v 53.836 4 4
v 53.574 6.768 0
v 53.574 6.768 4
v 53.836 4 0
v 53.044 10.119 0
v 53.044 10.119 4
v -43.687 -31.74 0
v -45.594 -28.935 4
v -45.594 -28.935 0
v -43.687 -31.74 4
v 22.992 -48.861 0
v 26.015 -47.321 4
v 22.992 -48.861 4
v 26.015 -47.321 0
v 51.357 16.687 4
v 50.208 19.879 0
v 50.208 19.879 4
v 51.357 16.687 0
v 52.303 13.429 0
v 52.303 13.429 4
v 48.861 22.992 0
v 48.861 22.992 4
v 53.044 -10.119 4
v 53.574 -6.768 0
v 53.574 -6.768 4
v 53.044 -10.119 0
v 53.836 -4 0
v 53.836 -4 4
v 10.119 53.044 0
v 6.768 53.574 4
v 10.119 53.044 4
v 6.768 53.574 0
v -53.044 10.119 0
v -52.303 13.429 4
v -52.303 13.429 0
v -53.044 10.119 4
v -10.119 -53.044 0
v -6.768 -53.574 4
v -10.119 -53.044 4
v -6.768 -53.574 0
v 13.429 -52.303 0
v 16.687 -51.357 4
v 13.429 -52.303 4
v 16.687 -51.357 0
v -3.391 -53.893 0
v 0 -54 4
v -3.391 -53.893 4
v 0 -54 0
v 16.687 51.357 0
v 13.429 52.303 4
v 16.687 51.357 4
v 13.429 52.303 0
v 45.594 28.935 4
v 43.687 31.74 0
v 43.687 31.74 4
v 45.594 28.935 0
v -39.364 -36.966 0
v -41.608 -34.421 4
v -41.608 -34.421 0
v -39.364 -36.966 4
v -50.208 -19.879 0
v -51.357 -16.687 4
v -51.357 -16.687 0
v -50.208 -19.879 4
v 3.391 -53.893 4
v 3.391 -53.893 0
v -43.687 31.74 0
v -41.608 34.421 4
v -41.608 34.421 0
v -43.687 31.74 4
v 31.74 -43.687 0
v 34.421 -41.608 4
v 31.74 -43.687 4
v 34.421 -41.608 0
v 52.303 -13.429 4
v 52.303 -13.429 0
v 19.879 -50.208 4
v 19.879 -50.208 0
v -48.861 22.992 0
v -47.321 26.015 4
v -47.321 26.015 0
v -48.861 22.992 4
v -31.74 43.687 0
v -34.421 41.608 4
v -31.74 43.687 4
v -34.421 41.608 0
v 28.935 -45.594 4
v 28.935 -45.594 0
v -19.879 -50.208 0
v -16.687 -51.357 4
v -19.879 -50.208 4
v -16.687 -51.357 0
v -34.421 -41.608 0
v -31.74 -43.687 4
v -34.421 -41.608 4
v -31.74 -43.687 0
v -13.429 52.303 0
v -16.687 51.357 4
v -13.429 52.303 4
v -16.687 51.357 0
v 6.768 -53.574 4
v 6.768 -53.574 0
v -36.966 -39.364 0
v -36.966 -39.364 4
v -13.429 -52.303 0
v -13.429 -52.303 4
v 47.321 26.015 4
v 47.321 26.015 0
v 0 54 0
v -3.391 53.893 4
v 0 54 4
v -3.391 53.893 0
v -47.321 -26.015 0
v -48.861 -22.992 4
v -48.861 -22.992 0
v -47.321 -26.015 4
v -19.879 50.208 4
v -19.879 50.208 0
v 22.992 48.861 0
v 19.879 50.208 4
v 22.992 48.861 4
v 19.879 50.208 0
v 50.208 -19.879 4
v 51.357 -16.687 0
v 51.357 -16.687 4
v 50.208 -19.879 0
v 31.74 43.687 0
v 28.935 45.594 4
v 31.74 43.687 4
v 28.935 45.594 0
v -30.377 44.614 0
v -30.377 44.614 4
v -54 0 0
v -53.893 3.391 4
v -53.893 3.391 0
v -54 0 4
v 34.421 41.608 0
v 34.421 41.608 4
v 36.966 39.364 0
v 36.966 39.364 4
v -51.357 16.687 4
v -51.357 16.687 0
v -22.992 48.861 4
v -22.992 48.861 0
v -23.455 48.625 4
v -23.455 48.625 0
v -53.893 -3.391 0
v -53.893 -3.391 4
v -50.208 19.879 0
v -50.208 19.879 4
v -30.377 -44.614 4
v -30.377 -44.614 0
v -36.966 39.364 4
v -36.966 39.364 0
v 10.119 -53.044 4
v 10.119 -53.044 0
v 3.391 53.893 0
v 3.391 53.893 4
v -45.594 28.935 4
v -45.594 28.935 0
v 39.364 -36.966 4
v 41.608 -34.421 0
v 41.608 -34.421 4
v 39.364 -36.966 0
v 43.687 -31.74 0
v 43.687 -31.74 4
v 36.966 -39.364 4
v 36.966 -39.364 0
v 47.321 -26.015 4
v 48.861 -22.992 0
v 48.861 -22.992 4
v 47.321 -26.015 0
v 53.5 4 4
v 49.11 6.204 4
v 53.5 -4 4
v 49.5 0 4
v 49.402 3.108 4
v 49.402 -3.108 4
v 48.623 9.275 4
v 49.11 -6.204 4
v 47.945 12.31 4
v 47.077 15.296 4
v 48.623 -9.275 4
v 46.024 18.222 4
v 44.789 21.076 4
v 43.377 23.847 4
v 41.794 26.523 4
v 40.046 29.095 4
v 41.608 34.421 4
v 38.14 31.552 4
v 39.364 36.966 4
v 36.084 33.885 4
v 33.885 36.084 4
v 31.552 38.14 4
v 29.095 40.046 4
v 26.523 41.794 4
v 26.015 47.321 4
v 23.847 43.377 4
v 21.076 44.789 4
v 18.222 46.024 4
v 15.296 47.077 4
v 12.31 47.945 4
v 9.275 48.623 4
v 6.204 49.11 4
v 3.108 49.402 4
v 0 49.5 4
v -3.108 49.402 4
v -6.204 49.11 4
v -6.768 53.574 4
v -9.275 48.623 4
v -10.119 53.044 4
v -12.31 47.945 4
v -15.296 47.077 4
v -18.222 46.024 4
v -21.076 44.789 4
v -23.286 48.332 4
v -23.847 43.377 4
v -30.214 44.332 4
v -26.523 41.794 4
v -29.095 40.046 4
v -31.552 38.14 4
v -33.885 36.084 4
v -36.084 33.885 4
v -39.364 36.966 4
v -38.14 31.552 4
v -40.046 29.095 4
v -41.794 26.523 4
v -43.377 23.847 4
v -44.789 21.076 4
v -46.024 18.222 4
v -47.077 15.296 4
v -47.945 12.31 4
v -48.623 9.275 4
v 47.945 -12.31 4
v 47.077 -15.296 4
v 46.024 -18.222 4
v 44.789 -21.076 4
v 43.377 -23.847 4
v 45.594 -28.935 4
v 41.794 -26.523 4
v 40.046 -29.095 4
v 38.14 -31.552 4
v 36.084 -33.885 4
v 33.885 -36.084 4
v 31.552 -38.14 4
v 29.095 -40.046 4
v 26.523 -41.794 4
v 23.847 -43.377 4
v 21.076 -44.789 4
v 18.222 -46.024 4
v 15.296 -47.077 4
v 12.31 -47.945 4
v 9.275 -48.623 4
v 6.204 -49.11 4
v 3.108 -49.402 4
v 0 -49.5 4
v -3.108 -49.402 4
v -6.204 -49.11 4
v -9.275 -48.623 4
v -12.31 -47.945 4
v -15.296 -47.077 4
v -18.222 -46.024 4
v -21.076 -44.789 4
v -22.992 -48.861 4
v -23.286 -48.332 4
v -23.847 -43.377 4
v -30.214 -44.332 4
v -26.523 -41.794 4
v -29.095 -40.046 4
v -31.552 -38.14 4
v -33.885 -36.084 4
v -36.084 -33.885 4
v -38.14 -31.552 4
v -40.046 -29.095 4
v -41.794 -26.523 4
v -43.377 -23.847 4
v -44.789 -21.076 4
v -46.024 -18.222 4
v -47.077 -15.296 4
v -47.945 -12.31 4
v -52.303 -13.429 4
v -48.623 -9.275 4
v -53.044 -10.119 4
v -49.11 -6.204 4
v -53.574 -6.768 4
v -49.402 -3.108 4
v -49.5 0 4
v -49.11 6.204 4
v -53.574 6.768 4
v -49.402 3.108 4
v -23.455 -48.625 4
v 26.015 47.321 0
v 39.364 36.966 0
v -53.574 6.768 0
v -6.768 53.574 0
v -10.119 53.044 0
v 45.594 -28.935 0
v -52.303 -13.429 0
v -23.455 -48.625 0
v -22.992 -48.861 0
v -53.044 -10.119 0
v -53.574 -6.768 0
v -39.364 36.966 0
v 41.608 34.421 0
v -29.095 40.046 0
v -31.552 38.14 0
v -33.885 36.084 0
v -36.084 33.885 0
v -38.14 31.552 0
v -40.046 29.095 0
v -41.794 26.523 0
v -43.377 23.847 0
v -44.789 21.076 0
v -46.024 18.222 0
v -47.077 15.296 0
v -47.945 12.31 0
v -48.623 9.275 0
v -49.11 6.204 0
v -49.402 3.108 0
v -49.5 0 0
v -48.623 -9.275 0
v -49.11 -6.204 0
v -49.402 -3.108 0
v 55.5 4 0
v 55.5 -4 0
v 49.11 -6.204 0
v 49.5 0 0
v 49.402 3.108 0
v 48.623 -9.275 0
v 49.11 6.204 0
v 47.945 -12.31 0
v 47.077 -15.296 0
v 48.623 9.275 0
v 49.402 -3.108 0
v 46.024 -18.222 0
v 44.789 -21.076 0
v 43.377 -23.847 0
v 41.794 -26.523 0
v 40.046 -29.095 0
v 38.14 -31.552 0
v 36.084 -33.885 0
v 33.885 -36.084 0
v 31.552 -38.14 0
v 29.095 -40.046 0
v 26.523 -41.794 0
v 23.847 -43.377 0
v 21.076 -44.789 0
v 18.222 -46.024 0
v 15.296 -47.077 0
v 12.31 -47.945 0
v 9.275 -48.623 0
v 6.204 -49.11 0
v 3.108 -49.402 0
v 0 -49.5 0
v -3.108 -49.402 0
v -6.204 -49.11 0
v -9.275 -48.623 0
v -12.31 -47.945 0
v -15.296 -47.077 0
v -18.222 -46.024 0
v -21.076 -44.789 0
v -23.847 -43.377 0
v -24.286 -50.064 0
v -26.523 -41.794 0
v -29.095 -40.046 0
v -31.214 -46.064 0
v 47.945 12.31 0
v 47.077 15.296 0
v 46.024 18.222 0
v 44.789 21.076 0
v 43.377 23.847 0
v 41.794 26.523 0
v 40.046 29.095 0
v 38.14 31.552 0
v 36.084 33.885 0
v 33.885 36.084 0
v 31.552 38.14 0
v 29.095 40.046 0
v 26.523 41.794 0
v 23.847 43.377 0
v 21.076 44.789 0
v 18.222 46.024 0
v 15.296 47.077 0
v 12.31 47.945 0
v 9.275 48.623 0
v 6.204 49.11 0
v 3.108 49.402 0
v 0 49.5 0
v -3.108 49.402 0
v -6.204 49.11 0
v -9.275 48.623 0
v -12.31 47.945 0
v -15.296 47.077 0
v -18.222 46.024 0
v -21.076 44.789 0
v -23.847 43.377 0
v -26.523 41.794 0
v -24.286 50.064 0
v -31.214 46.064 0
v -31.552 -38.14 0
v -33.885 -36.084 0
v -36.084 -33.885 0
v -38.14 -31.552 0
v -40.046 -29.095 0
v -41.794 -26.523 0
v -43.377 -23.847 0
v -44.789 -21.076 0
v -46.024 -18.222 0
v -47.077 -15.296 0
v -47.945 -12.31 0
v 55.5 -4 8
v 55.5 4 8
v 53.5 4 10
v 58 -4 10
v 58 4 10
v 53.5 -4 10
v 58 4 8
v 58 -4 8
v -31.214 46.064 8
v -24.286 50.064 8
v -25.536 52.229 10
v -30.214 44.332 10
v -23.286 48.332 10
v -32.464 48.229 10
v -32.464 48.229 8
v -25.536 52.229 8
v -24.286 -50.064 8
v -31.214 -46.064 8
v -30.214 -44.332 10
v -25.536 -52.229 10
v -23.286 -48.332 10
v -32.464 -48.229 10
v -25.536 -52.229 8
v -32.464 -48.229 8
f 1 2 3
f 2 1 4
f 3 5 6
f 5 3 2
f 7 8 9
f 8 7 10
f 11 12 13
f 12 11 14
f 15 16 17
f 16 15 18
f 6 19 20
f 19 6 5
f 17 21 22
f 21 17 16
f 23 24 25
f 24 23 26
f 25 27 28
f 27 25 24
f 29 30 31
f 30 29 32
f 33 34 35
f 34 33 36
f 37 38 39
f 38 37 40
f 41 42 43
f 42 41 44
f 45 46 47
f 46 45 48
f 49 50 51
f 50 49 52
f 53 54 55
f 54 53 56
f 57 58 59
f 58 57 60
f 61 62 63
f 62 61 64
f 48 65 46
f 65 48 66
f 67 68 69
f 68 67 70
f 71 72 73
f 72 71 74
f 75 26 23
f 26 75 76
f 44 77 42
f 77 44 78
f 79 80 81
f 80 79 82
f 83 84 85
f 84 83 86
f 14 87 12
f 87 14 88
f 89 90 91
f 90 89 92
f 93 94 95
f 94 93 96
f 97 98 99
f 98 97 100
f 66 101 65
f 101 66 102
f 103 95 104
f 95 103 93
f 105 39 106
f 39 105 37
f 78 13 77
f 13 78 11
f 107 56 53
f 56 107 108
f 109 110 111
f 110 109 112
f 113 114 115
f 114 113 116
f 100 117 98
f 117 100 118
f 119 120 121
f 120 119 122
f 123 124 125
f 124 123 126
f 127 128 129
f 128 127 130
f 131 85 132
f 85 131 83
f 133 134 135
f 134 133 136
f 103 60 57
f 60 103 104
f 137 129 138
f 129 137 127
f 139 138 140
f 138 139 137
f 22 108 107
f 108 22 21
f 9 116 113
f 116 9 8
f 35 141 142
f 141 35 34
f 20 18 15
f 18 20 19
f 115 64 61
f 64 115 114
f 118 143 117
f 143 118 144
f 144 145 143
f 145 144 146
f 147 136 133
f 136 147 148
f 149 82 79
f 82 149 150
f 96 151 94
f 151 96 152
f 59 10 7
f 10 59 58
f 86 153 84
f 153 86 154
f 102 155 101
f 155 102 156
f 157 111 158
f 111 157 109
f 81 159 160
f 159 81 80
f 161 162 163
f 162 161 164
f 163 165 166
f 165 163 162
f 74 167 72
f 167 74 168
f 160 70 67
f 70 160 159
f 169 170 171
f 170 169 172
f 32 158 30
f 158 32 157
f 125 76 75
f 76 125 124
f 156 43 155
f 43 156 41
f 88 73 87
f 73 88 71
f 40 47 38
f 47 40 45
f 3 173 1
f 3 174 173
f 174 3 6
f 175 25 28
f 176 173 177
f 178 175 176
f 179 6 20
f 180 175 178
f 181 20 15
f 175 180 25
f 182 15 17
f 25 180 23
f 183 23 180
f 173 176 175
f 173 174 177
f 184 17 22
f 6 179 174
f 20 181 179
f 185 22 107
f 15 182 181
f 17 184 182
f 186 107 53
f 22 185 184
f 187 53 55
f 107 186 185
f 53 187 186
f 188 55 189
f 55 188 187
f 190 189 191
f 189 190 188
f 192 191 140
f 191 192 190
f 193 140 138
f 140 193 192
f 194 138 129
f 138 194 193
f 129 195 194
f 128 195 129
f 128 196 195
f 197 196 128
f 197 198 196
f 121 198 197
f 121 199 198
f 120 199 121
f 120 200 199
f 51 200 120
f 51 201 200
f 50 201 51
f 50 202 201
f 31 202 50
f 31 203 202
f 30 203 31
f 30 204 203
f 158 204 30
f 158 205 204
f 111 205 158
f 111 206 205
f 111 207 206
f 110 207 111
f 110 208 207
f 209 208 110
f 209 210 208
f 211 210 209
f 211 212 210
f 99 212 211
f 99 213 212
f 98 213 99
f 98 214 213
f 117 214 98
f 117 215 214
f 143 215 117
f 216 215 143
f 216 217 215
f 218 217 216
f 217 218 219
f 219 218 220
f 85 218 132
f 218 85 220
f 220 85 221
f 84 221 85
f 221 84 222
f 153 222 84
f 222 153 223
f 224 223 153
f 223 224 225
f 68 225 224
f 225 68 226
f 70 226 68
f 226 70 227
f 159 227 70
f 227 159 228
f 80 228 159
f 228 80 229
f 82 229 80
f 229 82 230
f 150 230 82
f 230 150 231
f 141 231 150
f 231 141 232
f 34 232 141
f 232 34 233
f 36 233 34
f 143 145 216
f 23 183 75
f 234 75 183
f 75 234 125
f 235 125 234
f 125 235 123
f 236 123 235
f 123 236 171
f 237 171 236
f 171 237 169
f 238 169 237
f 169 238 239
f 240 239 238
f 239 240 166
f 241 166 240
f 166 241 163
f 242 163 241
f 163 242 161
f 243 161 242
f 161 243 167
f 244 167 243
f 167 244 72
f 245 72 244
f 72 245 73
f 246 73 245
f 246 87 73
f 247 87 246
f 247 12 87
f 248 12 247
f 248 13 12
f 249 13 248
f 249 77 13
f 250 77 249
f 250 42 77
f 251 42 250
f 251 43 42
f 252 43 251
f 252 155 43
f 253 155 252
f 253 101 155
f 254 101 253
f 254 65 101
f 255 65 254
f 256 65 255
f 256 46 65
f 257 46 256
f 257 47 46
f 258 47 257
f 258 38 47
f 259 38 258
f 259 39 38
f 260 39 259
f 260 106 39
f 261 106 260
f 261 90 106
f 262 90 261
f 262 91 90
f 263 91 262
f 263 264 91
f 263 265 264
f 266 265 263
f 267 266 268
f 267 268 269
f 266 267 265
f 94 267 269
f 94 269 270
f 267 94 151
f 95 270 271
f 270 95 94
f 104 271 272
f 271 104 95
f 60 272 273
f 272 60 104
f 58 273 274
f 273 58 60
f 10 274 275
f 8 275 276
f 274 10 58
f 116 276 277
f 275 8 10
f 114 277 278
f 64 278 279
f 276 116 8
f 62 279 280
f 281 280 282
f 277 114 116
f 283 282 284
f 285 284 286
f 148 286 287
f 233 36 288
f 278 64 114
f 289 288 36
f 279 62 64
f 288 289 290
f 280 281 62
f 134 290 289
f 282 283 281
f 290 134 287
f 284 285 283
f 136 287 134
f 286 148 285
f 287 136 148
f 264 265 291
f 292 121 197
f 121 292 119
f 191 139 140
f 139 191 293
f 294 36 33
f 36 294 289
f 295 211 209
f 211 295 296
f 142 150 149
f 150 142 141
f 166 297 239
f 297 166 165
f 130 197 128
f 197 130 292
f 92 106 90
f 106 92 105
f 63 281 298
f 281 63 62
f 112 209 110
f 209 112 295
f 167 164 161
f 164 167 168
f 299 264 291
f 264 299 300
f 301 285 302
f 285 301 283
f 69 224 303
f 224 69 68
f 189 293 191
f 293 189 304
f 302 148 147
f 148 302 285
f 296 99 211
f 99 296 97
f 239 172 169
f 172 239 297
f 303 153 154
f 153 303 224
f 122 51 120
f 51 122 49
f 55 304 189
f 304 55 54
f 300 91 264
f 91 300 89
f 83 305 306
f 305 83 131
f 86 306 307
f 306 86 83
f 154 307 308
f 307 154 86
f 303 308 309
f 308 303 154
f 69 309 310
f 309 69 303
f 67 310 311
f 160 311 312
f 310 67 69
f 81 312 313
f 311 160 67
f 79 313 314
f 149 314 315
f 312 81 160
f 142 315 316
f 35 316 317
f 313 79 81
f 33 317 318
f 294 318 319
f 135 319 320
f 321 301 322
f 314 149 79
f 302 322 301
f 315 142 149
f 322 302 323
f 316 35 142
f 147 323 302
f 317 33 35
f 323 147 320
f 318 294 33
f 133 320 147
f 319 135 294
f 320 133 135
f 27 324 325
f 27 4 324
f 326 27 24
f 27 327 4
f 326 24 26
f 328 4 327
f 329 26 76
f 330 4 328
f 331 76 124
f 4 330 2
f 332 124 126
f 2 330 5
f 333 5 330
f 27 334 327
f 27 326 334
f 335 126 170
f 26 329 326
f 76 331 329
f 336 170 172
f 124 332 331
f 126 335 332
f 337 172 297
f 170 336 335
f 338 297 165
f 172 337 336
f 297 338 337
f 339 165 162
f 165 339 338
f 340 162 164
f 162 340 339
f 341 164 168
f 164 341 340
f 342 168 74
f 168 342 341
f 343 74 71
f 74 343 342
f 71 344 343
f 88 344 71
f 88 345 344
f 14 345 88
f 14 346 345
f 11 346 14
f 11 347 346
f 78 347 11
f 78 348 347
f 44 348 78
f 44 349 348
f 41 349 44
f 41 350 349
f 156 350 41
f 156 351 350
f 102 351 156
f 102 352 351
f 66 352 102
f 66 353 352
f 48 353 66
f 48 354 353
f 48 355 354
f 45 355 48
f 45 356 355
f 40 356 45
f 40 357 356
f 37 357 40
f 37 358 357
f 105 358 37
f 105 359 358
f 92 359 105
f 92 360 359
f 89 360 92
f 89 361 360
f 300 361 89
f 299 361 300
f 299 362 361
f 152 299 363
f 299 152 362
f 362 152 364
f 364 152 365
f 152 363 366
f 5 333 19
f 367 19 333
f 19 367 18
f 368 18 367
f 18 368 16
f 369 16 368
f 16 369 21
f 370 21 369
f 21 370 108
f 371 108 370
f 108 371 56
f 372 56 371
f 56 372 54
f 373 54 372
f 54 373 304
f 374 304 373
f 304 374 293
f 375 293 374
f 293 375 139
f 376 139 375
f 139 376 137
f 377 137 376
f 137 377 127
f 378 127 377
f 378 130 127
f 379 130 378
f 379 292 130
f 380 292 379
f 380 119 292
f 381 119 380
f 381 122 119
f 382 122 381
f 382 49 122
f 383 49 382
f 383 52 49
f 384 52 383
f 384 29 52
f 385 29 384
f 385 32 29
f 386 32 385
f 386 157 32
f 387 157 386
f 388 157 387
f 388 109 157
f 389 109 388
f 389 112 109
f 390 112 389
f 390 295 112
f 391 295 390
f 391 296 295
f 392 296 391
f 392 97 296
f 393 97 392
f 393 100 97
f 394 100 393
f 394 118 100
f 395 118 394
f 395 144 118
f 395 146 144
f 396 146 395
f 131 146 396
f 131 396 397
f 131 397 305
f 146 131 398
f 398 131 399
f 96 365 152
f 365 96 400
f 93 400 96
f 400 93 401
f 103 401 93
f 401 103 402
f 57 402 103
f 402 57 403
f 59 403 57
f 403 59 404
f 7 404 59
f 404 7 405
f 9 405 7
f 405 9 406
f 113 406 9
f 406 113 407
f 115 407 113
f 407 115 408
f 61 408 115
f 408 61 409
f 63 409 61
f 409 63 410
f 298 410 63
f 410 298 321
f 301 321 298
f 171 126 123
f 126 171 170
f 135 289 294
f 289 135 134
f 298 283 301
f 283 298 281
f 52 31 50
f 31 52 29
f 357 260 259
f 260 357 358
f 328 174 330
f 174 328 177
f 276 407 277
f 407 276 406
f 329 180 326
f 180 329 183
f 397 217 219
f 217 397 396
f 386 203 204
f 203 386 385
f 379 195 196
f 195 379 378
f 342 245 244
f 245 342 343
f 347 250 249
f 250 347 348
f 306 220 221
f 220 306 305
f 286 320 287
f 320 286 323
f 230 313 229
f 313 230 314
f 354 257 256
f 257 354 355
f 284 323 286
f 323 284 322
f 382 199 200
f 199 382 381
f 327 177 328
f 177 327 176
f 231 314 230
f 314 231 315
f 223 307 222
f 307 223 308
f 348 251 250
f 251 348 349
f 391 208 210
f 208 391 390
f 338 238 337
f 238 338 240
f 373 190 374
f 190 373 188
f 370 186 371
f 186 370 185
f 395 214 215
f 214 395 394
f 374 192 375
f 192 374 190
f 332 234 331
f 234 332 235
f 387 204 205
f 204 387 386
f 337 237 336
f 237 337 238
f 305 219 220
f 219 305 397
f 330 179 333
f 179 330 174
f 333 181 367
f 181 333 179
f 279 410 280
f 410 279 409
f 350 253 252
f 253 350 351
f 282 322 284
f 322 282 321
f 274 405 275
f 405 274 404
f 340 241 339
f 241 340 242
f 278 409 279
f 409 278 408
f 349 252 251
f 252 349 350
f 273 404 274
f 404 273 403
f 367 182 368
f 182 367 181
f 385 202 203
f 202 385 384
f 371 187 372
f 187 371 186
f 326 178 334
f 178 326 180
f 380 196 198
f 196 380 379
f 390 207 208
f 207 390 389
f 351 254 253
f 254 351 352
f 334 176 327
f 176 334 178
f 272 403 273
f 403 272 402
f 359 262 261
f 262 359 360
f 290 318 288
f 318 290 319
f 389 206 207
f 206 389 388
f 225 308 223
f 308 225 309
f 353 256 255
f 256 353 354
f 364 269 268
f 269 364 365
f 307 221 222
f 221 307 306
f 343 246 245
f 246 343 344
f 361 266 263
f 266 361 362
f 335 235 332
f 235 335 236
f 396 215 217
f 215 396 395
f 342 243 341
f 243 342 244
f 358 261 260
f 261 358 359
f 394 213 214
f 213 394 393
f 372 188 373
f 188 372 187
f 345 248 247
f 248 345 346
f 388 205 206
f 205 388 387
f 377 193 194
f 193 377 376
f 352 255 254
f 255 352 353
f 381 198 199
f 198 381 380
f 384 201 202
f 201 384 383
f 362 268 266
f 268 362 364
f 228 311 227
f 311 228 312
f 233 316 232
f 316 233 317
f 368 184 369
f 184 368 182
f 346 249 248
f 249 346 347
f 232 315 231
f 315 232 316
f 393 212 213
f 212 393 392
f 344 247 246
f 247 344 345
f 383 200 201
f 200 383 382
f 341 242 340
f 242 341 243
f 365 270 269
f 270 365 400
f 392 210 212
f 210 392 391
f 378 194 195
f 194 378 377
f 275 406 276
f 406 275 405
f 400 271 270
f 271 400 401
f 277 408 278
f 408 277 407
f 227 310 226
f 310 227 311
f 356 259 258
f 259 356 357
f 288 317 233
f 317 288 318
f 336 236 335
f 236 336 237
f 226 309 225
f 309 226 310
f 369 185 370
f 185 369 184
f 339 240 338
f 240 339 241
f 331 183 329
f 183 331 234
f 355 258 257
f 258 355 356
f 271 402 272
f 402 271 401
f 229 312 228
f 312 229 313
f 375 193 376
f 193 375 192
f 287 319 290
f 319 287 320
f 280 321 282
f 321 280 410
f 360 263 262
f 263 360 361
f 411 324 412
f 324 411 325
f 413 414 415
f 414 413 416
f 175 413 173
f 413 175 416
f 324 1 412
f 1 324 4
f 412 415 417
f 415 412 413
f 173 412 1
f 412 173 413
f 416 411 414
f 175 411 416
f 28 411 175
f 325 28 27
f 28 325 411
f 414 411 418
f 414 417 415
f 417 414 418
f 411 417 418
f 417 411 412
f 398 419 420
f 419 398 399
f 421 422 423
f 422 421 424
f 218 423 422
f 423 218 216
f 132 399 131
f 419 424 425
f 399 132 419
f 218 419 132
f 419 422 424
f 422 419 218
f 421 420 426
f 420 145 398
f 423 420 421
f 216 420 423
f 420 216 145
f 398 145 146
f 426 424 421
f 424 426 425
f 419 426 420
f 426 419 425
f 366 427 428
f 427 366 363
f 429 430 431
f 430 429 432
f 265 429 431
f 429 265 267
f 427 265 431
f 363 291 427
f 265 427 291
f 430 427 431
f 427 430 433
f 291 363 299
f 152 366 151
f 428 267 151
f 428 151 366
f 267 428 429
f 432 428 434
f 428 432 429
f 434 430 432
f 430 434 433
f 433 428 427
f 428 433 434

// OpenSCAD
$fn = 100;

module makeRim() {
    rimInnerD = 99;
    rimOuterD = 108;
    rimHeight = 4;

    translate([0,0,rimHeight / 2]) {
        
        difference() {
            cylinder(h=rimHeight, d=rimOuterD, center=true);
            cylinder(h=rimHeight + 2, d=rimInnerD, center=true);
        }
    }    
}

module makeClip() {
    translate([0,0,5]) {
       cube(size=[2,8,10], center=true);
    }
    
    translate([2,0,9]) {
       cube(size=[3,8,2], center=true);
    }
    
}

module setClip(deg) {
    rotate([0,0,deg]) {
        translate([105/2+2,0,0]) {
            makeClip();
        }
    }
}

makeRim();
//makeClip();
setClip(0);
setClip(360/3);
setClip(360/3*2);
